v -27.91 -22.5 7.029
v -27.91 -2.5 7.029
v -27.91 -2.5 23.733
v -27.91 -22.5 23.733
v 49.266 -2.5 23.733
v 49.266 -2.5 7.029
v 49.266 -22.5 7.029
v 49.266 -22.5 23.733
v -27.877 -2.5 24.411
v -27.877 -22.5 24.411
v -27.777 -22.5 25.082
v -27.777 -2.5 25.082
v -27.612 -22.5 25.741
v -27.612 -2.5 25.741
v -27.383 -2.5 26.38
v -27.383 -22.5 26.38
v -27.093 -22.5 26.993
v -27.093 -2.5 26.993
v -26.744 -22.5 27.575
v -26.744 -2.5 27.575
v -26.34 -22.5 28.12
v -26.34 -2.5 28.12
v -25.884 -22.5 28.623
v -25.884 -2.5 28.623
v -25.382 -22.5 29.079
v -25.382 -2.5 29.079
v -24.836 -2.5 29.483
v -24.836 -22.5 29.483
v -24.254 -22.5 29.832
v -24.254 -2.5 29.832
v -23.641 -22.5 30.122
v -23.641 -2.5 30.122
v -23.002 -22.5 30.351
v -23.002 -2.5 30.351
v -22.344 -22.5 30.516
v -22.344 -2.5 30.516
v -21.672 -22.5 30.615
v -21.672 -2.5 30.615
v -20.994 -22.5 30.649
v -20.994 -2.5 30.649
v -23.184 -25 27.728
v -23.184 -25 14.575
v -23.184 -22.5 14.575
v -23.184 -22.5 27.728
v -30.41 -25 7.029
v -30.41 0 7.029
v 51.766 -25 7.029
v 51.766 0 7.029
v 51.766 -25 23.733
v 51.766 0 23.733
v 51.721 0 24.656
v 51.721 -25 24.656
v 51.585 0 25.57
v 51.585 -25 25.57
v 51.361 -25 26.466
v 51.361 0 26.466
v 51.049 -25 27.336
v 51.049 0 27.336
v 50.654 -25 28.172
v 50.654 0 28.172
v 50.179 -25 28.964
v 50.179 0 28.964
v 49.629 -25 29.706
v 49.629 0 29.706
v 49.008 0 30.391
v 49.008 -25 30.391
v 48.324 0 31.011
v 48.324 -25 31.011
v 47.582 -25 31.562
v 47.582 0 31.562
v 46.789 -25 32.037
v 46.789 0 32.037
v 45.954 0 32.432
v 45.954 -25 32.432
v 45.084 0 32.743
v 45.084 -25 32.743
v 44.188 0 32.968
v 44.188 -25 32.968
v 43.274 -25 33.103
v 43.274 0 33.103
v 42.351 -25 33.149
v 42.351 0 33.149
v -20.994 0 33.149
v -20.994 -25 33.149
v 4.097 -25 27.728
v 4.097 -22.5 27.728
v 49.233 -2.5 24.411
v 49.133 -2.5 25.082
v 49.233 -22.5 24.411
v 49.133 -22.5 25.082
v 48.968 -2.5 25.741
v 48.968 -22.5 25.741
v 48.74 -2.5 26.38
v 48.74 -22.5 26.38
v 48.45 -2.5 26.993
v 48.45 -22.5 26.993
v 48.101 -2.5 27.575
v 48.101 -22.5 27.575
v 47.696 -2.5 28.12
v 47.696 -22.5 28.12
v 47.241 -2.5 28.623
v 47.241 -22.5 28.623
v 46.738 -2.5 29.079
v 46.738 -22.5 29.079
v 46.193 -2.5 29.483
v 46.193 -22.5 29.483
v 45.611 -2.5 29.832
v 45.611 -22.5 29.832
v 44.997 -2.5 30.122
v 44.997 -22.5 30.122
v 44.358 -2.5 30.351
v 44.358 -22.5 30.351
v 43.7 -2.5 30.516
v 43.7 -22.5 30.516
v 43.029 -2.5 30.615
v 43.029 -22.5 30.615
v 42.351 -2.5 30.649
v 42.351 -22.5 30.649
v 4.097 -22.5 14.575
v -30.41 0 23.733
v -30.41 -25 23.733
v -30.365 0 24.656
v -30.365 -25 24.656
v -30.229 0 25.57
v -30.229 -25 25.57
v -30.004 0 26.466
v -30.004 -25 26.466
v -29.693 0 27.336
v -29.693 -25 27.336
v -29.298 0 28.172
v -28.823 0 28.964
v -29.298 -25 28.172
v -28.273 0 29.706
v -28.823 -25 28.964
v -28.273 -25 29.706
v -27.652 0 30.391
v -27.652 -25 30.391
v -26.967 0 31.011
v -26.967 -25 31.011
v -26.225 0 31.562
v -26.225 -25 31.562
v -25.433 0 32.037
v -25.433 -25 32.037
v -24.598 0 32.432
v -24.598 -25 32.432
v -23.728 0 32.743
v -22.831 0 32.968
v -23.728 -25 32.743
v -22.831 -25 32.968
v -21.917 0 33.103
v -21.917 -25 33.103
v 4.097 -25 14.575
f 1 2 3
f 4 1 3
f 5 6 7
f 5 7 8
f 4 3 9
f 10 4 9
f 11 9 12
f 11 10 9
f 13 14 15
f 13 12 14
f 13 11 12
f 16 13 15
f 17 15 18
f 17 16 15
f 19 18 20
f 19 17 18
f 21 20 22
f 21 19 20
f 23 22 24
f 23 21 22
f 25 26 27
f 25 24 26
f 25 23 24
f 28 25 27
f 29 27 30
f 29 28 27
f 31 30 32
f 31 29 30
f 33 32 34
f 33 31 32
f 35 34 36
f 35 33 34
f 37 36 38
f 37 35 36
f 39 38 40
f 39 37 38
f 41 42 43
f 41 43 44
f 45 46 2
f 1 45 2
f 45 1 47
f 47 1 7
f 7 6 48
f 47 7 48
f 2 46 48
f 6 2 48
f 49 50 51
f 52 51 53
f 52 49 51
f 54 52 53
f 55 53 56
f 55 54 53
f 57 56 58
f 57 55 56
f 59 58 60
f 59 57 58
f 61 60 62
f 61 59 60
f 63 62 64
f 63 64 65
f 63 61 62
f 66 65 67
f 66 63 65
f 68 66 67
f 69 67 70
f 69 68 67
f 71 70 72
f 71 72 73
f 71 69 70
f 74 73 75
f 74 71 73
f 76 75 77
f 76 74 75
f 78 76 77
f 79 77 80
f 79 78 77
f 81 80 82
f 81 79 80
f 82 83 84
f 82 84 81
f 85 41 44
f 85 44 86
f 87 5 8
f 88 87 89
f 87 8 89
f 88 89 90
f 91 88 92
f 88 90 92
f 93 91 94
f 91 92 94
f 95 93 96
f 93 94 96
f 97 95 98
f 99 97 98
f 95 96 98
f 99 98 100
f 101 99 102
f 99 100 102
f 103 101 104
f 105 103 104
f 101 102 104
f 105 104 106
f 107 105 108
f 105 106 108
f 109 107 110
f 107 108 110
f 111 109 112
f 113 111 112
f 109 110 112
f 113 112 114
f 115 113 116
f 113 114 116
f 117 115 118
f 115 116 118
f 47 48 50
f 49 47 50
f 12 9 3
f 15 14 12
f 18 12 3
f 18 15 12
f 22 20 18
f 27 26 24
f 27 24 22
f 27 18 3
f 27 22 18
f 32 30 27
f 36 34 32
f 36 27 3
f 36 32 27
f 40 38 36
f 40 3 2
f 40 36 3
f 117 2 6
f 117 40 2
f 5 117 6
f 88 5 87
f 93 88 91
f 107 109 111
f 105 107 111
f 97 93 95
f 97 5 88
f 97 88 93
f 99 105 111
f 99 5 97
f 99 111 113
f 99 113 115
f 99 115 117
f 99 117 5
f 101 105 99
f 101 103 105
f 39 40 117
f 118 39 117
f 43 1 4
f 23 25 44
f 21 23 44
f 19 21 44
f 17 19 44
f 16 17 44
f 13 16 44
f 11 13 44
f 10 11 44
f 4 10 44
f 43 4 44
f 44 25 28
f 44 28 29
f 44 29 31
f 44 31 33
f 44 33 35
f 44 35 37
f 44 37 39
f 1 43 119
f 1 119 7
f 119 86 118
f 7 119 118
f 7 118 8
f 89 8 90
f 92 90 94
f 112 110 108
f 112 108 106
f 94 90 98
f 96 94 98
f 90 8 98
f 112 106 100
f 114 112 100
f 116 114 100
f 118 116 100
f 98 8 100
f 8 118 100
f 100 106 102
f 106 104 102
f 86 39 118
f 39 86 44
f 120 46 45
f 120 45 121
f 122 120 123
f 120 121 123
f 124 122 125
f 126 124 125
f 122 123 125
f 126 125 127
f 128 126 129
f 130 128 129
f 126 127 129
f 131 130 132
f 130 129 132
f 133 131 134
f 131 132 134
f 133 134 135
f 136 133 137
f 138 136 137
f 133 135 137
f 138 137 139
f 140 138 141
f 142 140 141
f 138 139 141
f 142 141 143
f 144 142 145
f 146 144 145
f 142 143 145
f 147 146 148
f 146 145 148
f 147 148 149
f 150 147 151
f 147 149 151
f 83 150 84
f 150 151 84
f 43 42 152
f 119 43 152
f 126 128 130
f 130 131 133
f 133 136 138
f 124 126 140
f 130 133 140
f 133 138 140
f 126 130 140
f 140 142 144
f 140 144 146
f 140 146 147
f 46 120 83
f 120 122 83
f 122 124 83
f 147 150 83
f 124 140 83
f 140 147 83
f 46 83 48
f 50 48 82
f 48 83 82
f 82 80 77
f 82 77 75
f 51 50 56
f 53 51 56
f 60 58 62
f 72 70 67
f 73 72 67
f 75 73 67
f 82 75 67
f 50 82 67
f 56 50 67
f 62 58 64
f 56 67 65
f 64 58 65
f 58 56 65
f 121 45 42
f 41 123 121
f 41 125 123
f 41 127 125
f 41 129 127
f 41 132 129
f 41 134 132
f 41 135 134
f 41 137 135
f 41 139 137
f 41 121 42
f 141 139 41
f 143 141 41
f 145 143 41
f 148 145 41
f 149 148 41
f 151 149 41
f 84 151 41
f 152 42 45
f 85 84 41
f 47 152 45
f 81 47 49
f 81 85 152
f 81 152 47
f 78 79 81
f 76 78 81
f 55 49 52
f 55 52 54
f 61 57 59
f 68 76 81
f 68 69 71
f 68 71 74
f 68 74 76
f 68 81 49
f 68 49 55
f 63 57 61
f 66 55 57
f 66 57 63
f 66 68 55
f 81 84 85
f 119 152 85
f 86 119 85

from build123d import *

# Parameters (mm, degrees)
F0_W     = 82.176
F0_H     = 26.12
F1_DEPTH = 25
F2_R     = 9.4154328933
F3_T     = -2.5
F4_W     = 27.2806887515
F4_H     = 13.1527986377
F5_DEPTH = 14.9


# Not quite as in the source:
# - a feature names something its author has since deleted; it is built from what else it names


with BuildPart() as f1:
    # F0 (on Front) → F1 (new body)
    with BuildSketch(Plane.XZ):
        with Locations((10.6781609957, 20.0886886767)):
            Rectangle(F0_W, F0_H)
    extrude(amount=F1_DEPTH)

    # F2
    f2_edges = [f1.edges().sort_by_distance(p)[0] for p in [
        (-30.409839, -12.5, 33.148689),
        (51.766161, -12.5, 33.148689),
    ]]
    fillet(f2_edges, radius=F2_R)

    # F3
    f3_openings = [f1.faces().sort_by_distance(p)[0] for p in [
        (10.678161, -12.5, 7.028689),
    ]]
    offset(amount=F3_T, openings=f3_openings)

    # F4 (on face) → F5 (cut)
    with BuildSketch(Plane.XZ.offset(25)):
        with Locations((-9.543599328, 21.1515771225)):
            Rectangle(F4_W, F4_H)
    extrude(amount=-F5_DEPTH, mode=Mode.SUBTRACT)


solid = f1.part
